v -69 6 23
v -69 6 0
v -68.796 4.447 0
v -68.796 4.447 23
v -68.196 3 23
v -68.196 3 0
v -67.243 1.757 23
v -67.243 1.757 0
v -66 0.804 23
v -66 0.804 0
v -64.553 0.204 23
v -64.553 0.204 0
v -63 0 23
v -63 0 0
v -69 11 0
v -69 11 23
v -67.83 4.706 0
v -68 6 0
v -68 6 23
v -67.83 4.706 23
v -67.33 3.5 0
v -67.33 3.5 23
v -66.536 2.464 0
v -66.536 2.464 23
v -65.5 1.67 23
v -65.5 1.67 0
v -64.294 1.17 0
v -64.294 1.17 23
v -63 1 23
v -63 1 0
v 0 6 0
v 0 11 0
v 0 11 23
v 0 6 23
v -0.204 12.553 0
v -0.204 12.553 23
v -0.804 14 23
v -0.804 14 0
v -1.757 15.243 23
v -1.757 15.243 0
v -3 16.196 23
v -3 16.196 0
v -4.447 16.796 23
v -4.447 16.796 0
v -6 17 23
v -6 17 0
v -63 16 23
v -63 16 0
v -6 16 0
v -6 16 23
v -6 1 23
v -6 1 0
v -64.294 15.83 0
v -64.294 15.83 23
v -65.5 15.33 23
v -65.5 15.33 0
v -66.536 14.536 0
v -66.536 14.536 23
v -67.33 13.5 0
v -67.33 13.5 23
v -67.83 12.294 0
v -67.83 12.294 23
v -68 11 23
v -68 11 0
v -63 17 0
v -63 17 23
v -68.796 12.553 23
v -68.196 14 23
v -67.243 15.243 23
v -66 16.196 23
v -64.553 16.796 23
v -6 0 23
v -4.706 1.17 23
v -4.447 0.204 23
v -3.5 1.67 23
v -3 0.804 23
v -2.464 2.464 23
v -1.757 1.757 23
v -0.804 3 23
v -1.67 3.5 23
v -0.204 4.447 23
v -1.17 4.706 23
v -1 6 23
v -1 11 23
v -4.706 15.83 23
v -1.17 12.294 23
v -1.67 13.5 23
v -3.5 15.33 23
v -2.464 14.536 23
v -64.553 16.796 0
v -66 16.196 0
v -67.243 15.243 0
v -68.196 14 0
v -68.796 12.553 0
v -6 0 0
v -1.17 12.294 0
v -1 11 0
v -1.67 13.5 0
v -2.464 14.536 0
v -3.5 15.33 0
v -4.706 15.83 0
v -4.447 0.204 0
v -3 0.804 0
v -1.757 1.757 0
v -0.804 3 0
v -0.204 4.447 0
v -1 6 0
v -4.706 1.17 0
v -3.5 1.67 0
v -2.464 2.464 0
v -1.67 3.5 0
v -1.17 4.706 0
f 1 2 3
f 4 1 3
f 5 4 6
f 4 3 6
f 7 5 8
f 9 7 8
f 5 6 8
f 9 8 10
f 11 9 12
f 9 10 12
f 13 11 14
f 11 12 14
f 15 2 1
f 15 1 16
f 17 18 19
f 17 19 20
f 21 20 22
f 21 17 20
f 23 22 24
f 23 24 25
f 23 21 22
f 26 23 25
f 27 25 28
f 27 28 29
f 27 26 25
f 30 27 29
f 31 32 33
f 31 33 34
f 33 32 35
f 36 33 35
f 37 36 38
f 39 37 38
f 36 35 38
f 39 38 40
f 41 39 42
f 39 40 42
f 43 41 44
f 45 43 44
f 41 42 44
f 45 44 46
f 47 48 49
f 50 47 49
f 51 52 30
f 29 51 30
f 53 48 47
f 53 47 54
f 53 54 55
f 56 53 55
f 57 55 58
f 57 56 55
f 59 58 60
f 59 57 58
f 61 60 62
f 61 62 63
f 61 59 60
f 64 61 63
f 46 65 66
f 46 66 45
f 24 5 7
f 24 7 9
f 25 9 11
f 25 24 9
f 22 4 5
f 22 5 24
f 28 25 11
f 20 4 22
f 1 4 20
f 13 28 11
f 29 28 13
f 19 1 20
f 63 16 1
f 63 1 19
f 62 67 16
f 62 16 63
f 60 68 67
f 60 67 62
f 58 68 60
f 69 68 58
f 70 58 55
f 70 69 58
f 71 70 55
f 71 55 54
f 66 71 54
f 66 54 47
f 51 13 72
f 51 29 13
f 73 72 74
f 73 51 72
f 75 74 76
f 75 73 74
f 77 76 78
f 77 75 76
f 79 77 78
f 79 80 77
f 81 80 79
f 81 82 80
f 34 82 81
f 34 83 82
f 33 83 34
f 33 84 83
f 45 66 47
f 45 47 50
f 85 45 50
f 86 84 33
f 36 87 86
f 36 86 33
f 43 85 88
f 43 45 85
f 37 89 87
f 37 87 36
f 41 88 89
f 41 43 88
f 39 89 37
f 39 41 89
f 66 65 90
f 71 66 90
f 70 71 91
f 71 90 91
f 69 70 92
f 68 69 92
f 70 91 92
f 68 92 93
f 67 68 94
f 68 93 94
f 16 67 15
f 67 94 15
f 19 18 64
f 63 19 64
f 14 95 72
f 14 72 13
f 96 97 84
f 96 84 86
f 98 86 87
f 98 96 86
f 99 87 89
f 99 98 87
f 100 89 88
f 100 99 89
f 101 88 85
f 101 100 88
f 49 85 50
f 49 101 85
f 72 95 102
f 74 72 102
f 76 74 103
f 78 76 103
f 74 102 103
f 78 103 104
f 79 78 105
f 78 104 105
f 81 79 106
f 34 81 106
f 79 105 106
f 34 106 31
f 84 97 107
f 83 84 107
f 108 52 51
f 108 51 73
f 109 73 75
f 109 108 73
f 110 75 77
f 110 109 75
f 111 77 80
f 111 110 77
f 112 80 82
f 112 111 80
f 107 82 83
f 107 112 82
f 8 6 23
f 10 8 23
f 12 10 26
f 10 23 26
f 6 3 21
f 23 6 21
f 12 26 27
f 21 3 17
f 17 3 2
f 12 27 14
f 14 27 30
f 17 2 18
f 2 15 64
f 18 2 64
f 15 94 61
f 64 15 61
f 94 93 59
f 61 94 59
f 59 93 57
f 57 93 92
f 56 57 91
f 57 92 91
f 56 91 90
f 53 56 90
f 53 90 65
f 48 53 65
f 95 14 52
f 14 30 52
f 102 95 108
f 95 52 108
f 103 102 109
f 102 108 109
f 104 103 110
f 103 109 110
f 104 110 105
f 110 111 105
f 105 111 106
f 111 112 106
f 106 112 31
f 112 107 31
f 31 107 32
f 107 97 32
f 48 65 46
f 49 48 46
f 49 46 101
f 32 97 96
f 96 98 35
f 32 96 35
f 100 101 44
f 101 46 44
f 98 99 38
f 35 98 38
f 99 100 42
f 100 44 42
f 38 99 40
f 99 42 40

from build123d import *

# Parameters (mm, degrees)
PAD_DEPTH = 23


with BuildPart() as part:
    # Sketch → Pad (new body)
    with BuildSketch(Plane.XY):
        with BuildLine():
            ThreePointArc((-63, 17), (-67.242641, 15.242641), (-69, 11))
            Line((-69, 6), (-69, 11))
            ThreePointArc((-69, 6), (-67.242641, 1.757359), (-63, 0))
            Line((-6, 0), (-63, 0))
            ThreePointArc((-6, 0), (-1.757359, 1.757359), (0, 6))
            Line((0, 11), (0, 6))
            ThreePointArc((0, 11), (-1.757359, 15.242641), (-6, 17))
            Line((-63, 17), (-6, 17))
        make_face()
        with BuildLine():
            ThreePointArc((-63, 16), (-66.535534, 14.535534), (-68, 11))
            Line((-68, 6), (-68, 11))
            ThreePointArc((-68, 6), (-66.535534, 2.464466), (-63, 1))
            Line((-6, 1), (-63, 1))
            ThreePointArc((-6, 1), (-2.464466, 2.464466), (-1, 6))
            Line((-1, 11), (-1, 6))
            ThreePointArc((-1, 11), (-2.464466, 14.535534), (-6, 16))
            Line((-63, 16), (-6, 16))
        make_face(mode=Mode.SUBTRACT)
    extrude(amount=PAD_DEPTH)


solid = part.part
